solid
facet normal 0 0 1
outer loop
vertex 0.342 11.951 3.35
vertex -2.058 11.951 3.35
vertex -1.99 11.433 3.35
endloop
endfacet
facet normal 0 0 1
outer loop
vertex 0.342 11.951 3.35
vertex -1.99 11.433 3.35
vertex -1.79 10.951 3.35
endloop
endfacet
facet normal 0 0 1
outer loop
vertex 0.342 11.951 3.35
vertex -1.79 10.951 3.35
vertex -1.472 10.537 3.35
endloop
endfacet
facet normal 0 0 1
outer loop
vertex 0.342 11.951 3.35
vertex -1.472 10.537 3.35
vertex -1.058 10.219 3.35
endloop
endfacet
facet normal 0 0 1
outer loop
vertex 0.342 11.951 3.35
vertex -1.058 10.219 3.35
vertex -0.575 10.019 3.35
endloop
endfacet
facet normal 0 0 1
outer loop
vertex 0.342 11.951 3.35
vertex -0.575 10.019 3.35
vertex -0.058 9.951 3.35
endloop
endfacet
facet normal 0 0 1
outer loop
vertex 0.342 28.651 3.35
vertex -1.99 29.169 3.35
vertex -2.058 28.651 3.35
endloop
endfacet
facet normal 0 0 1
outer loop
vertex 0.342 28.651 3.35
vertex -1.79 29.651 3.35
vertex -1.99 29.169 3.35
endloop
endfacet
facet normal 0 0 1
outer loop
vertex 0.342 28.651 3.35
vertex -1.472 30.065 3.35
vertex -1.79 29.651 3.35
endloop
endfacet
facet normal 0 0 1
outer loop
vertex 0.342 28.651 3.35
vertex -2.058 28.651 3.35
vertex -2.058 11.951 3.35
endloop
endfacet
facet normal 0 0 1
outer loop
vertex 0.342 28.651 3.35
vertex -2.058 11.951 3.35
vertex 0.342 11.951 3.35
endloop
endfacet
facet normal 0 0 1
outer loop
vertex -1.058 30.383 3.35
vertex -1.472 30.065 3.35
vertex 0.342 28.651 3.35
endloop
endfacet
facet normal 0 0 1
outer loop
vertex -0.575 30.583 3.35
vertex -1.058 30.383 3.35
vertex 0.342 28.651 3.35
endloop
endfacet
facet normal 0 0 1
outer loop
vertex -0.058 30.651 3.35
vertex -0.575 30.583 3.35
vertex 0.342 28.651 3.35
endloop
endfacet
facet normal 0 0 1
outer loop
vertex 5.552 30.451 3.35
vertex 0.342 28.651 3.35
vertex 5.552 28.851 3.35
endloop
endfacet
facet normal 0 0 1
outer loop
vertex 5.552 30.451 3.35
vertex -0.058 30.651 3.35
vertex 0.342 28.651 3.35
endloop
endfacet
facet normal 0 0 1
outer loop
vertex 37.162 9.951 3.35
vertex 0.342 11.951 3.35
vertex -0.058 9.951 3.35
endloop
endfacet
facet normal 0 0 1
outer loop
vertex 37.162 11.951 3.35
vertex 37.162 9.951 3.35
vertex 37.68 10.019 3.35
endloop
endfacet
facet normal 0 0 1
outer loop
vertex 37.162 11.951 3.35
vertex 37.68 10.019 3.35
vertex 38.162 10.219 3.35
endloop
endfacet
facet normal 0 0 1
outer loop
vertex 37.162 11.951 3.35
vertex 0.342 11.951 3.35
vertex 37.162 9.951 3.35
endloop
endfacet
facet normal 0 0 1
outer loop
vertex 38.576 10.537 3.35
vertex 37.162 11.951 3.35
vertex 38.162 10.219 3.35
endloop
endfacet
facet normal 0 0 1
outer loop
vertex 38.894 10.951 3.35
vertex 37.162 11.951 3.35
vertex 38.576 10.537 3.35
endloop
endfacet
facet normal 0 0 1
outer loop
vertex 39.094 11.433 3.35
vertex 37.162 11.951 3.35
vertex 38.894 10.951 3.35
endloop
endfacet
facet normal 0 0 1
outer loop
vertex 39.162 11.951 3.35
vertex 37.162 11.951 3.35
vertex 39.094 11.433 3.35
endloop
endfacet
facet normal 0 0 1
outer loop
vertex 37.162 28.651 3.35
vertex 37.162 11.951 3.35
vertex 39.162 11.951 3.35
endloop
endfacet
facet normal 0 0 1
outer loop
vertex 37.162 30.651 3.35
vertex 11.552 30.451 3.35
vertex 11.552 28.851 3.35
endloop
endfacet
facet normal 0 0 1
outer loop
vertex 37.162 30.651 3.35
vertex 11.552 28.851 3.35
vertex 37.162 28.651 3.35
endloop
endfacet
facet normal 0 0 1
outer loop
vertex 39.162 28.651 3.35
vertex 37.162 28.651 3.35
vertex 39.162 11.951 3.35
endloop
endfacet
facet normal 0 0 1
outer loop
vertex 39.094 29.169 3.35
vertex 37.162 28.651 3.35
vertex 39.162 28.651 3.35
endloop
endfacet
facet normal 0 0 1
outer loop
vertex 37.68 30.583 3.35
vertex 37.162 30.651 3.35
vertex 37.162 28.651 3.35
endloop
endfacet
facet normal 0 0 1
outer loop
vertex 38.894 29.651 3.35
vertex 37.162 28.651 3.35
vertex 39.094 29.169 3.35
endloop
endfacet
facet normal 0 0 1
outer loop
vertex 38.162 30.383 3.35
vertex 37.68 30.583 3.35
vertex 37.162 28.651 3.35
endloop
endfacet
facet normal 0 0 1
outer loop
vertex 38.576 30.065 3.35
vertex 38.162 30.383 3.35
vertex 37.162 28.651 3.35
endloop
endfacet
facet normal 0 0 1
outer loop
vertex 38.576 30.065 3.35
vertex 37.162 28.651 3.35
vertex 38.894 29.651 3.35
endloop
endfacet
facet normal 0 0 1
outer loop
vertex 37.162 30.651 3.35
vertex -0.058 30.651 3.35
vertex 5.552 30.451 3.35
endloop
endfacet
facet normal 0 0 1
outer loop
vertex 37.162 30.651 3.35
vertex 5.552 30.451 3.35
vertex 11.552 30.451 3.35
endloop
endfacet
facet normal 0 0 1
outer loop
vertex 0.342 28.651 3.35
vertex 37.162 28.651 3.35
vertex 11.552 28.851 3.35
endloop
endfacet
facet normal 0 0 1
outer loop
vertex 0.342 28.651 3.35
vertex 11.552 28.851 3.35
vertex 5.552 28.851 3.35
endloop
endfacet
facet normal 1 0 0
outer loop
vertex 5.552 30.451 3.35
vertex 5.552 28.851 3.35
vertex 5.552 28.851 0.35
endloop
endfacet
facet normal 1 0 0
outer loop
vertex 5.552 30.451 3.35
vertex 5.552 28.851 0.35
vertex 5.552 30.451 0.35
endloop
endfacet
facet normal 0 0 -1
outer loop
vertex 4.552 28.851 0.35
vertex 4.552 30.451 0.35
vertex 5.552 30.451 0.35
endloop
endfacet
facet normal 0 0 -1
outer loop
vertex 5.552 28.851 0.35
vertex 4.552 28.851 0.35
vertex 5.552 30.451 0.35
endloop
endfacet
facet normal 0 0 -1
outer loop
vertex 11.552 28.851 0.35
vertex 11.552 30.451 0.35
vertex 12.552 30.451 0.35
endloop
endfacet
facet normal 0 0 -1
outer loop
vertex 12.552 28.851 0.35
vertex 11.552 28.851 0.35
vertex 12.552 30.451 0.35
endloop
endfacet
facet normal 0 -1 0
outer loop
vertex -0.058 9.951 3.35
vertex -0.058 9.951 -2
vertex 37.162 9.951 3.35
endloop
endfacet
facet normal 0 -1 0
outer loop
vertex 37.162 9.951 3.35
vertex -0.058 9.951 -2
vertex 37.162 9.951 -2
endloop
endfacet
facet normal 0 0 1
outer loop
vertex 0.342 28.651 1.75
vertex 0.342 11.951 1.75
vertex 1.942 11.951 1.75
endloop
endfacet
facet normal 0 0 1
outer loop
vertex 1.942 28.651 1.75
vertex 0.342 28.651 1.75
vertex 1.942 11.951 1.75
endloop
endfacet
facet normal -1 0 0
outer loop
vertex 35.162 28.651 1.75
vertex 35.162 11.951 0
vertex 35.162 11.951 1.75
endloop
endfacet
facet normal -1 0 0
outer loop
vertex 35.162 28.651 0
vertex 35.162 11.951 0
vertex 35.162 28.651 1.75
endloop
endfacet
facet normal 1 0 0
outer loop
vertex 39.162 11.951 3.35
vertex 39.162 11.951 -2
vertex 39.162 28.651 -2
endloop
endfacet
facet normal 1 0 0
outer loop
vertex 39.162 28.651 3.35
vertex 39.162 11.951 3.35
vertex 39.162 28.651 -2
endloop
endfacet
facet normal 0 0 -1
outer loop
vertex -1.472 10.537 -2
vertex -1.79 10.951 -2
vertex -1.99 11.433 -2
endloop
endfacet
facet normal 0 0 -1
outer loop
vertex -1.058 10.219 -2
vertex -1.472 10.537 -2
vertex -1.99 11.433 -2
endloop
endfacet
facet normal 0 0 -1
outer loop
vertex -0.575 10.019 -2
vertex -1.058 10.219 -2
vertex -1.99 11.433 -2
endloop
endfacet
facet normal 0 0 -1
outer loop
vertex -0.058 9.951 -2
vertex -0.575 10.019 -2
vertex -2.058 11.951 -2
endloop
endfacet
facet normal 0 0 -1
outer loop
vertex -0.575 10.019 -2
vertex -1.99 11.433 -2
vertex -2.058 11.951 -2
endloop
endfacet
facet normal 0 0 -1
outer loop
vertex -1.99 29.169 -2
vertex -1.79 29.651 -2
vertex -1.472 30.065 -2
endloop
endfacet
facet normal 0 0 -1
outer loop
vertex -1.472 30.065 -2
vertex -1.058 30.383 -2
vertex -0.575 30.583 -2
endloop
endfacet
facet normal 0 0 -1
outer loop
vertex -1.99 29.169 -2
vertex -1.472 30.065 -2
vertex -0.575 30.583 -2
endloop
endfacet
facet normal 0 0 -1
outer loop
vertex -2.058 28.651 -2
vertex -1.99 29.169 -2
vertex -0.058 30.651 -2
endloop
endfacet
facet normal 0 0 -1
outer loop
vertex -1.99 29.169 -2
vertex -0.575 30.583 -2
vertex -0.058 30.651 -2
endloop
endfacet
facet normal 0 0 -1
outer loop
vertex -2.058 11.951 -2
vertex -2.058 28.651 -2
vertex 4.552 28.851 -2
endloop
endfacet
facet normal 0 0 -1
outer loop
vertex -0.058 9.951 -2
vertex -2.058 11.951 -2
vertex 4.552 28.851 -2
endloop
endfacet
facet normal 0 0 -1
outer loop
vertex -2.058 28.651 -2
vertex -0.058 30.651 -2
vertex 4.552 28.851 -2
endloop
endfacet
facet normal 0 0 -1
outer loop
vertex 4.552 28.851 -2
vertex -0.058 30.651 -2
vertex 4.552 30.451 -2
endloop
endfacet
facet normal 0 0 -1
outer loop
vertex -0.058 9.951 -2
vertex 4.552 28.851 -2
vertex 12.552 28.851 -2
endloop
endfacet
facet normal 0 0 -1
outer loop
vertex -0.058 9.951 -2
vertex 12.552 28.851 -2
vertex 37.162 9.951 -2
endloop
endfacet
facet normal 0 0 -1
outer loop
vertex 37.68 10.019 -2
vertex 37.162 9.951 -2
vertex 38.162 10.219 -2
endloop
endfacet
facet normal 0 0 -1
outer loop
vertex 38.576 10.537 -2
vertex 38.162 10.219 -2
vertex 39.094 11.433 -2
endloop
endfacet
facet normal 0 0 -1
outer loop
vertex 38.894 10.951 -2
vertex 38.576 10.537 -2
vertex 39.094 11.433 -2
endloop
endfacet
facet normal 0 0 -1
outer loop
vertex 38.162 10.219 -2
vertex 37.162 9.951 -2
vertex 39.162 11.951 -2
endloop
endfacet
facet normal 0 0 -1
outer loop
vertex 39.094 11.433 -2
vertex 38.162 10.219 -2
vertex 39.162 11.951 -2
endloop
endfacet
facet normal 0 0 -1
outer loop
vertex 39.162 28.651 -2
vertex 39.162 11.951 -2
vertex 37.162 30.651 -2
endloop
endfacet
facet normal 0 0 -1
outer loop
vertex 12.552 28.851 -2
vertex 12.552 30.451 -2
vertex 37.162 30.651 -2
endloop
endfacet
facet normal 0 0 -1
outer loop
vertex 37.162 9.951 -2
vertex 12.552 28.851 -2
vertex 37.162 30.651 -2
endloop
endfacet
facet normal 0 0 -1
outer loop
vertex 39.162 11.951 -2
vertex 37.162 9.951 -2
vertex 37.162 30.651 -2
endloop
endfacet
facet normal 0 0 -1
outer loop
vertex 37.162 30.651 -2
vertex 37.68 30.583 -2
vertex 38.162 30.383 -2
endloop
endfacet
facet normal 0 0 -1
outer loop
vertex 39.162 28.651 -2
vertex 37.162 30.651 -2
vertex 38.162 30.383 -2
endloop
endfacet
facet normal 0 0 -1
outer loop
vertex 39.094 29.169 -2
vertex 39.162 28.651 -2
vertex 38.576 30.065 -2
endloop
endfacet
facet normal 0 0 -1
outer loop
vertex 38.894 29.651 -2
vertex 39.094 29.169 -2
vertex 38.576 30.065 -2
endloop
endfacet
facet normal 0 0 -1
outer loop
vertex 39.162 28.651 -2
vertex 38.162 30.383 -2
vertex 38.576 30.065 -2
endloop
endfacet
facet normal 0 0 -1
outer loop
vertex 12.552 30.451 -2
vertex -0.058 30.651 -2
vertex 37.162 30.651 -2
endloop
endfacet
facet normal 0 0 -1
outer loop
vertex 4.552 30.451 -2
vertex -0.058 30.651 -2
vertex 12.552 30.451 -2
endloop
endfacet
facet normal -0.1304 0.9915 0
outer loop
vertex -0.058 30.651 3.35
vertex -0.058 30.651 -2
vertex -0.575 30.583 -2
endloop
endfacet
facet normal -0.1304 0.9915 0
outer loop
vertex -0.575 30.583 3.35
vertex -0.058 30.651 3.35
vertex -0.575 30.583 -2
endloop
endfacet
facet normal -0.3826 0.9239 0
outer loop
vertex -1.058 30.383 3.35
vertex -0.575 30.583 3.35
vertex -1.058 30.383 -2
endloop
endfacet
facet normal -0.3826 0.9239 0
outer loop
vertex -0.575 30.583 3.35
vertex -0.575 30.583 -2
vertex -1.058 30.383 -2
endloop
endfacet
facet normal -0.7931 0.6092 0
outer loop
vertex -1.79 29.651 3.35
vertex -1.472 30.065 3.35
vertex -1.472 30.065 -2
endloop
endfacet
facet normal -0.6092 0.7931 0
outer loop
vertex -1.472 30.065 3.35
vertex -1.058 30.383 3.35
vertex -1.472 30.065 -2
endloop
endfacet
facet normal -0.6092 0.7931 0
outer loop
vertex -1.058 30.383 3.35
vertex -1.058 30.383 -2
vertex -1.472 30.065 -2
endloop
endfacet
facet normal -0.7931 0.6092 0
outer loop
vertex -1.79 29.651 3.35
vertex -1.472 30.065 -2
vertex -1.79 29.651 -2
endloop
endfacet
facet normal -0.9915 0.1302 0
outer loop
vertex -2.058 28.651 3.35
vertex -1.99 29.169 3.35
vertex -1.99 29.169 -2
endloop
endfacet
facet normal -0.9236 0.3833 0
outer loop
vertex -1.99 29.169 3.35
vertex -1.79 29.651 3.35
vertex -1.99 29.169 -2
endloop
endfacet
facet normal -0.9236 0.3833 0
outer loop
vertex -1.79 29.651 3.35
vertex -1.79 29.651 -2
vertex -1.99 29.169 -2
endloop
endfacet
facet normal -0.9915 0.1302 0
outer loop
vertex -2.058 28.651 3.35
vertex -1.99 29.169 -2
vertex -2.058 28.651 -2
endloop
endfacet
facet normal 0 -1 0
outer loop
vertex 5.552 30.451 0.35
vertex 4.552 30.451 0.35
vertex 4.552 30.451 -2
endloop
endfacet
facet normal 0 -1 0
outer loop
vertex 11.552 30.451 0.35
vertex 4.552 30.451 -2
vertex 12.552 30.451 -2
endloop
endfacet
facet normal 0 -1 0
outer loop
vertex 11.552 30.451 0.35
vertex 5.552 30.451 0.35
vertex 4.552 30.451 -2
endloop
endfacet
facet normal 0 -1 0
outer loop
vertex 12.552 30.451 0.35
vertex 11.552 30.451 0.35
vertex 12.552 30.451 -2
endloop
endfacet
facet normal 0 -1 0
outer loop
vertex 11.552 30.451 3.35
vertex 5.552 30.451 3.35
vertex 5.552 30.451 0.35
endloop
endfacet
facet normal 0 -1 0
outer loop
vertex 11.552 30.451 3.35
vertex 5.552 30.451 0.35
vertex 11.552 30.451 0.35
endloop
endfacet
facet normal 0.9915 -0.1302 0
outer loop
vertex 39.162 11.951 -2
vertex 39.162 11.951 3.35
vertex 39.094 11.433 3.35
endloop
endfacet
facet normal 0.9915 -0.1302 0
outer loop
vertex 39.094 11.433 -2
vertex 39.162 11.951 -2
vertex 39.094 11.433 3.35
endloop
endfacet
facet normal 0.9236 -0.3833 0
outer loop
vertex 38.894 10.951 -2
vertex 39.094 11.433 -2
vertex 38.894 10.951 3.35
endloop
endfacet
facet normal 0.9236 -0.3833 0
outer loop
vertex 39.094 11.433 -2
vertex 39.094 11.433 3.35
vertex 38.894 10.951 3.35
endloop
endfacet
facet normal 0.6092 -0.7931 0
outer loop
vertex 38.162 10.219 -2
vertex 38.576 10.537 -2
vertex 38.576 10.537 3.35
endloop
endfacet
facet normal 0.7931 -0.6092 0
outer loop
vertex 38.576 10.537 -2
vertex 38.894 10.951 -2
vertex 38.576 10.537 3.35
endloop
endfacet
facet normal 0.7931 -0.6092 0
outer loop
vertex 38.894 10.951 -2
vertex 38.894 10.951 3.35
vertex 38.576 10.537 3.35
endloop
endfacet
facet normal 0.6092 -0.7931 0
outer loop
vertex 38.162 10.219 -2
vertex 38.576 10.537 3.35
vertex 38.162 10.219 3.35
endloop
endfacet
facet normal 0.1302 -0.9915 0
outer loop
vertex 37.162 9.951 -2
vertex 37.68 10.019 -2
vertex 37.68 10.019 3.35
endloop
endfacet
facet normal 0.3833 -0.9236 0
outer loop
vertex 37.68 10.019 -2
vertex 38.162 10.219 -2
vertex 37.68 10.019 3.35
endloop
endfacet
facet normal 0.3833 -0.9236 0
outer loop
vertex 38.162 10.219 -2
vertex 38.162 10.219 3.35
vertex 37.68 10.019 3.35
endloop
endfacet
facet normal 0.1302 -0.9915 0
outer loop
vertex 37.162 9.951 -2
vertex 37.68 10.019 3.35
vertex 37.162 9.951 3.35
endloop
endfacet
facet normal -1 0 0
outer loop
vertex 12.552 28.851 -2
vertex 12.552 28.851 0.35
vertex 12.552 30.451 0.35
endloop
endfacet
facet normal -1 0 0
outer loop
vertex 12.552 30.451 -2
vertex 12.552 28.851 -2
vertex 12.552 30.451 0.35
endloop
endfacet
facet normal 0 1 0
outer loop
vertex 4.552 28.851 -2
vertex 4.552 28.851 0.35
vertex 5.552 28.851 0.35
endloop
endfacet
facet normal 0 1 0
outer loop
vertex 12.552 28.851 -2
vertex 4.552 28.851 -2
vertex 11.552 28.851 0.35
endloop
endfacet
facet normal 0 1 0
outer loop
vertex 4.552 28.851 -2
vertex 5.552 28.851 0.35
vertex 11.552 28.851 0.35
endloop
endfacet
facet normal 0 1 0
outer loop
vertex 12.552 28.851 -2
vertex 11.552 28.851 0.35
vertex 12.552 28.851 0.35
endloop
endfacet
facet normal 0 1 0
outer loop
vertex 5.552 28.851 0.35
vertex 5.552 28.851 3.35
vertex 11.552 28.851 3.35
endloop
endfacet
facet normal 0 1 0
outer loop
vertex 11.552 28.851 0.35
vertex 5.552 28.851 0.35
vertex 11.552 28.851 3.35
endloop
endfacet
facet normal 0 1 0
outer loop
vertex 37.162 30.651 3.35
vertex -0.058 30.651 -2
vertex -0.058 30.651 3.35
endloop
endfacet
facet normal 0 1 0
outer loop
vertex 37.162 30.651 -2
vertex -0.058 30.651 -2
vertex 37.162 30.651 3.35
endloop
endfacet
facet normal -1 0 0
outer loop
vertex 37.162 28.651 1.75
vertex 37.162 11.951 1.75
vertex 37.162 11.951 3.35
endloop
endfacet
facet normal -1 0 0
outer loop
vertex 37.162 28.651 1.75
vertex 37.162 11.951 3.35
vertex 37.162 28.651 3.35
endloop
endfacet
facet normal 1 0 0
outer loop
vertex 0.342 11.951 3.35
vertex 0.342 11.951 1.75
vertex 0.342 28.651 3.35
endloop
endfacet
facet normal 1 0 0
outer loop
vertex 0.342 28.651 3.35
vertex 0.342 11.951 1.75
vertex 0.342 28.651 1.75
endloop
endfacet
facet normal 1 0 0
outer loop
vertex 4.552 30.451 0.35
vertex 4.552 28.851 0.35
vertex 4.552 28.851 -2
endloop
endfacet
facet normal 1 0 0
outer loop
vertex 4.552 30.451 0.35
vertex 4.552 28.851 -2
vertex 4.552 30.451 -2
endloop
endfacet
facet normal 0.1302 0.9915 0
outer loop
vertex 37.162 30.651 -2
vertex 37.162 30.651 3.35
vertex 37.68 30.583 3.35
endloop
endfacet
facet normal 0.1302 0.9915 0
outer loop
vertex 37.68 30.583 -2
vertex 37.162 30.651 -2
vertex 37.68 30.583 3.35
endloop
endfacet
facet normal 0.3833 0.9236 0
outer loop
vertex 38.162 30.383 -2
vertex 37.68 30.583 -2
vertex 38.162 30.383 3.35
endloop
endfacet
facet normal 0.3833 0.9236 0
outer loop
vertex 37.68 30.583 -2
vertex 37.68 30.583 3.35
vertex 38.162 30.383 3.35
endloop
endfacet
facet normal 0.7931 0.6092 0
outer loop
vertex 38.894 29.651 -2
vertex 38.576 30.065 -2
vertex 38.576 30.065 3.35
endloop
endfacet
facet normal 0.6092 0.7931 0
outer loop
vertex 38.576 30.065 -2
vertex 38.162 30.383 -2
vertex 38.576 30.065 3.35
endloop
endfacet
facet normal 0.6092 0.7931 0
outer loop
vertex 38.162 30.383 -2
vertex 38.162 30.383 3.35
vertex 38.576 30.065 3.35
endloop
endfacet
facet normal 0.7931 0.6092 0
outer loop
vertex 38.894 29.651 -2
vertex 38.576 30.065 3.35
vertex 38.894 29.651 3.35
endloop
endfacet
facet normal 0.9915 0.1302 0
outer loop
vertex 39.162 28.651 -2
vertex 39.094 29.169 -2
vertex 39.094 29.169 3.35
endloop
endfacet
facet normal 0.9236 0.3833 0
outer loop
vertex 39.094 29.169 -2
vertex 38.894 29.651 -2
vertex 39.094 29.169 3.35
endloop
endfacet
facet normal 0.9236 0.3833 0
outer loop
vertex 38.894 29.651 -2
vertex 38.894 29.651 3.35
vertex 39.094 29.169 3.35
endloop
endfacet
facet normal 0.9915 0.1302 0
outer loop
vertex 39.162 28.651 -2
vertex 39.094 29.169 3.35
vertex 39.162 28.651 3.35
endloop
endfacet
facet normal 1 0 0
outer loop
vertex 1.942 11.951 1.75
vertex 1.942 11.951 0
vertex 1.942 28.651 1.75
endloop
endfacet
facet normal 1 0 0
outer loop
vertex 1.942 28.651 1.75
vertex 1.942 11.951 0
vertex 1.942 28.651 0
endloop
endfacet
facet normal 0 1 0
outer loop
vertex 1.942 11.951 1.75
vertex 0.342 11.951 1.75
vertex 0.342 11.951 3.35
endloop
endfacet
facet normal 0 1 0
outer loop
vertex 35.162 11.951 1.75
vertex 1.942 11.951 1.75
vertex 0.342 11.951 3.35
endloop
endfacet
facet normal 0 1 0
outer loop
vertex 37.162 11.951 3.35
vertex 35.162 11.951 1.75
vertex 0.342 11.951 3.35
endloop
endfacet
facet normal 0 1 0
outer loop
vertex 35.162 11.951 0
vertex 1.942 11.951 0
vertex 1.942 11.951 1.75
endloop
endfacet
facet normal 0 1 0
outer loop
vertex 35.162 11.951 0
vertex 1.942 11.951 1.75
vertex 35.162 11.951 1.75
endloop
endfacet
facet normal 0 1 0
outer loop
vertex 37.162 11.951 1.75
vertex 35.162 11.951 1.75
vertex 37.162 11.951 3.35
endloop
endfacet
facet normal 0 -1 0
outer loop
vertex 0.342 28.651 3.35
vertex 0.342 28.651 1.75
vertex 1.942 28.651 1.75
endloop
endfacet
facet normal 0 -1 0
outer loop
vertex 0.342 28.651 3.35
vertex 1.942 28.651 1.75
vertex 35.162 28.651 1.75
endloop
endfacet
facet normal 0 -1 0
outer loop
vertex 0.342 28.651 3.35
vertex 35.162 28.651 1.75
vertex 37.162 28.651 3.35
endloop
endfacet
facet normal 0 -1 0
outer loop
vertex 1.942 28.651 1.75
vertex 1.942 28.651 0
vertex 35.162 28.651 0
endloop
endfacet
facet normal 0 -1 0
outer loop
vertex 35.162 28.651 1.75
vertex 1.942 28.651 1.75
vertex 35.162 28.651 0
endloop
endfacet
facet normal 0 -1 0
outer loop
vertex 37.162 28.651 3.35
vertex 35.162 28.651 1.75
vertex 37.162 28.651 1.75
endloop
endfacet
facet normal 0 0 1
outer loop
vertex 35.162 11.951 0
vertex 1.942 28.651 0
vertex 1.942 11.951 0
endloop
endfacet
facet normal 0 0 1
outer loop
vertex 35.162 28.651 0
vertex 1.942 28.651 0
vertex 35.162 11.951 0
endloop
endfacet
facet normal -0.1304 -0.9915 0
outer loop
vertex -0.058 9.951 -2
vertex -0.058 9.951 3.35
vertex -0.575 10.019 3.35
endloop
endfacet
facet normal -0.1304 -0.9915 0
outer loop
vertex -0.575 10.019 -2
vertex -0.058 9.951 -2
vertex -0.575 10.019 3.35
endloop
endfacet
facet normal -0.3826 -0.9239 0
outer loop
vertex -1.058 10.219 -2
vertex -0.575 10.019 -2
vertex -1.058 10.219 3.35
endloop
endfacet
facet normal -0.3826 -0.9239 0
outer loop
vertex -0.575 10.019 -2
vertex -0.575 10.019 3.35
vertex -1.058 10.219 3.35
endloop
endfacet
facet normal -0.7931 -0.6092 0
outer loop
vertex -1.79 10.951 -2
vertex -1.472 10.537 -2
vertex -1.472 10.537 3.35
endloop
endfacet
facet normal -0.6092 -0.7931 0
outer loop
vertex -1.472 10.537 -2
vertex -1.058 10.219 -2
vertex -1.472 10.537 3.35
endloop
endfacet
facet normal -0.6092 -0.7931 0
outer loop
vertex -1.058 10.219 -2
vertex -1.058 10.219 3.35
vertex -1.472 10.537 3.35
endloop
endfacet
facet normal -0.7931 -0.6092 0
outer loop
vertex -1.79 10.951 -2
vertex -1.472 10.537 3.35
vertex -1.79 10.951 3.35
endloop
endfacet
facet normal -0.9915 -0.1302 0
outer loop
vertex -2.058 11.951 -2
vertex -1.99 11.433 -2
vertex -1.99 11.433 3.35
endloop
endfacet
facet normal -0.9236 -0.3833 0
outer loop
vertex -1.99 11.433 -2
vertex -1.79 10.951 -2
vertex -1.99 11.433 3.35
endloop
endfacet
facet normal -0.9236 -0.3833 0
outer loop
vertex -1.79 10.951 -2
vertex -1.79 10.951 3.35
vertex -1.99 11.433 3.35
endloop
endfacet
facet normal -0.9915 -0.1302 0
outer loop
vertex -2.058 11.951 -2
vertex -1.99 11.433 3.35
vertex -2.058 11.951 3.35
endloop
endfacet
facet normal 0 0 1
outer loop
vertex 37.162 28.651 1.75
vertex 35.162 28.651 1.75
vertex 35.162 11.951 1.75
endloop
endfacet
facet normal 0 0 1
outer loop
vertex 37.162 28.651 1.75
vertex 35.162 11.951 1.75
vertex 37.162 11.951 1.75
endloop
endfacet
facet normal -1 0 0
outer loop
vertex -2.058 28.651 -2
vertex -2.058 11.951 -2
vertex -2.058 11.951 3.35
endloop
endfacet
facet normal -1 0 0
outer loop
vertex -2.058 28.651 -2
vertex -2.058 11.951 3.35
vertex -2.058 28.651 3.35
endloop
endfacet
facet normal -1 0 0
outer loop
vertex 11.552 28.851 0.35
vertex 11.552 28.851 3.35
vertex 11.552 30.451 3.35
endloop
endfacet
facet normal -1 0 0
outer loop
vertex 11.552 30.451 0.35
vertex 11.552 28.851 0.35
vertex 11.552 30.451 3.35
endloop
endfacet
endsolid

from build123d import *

# Parameters (mm, degrees)
CROQUIS1_W              = 37.22
CROQUIS1_H              = 16.7
SALIENTE_EXTRUIR1_DEPTH = 3.35
VACIADO1_T              = 2
REDONDEO1_R             = 2
CROQUIS2_W              = 2
CROQUIS2_H              = 16.7
SALIENTE_EXTRUIR2_DEPTH = 1.75
CROQUIS6_W              = 0.4
CROQUIS6_H              = 16.7
SALIENTE_EXTRUIR5_DEPTH = 1.6
CROQUIS7_W              = 6
CROQUIS7_H              = 1.6
CORTAR_EXTRUIR1_DEPTH   = 3
CROQUIS10_W             = 8
CROQUIS10_H             = 1.6
CORTAR_EXTRUIR2_DEPTH   = 3


with BuildPart() as part:
    # Croquis1 → Saliente-Extruir1 (new body)
    with BuildSketch(Plane.XY):
        with Locations((18.552250715, 20.301071835)):
            Rectangle(CROQUIS1_W, CROQUIS1_H)
    extrude(amount=SALIENTE_EXTRUIR1_DEPTH)

    # Vaciado1
    vaciado1_openings = [part.faces().sort_by_distance(p)[0] for p in [
        (18.552250715, 20.301071835, 3.35),
    ]]
    offset(amount=VACIADO1_T, openings=vaciado1_openings, kind=Kind.INTERSECTION)

    # Redondeo1
    # the kernel refuses this fillet: 2 mm, written as the material it takes off along each edge
    with BuildSketch(Plane(origin=(-2.057749285, 30.651071835, -7), x_dir=(1, 0, 0), z_dir=(0, 0, 1)), Plane(origin=(39.162250715, 30.651071835, 8.35), x_dir=(-1, 0, 0), z_dir=(0, 0, -1)), Plane(origin=(39.162250715, 9.951071835, 8.35), x_dir=(0, 1, 0), z_dir=(0, 0, -1)), Plane(origin=(-2.057749285, 9.951071835, 8.35), x_dir=(1, 0, 0), z_dir=(0, 0, -1))) as redondeo1_piece_1:
        with BuildLine():
            CenterArc((REDONDEO1_R, -REDONDEO1_R), REDONDEO1_R, 90, 90)
            Line((0, -REDONDEO1_R), (0, 0))
            Line((0, 0), (REDONDEO1_R, 0))
        make_face()
    extrude(amount=15.35, mode=Mode.SUBTRACT)

    # Croquis2 → Saliente-Extruir2 (add)
    with BuildSketch(Plane.XY):
        with Locations((0.942250715, 20.301071835)):
            Rectangle(CROQUIS2_W, CROQUIS2_H)
        with Locations((36.162250715, 20.301071835)):
            Rectangle(CROQUIS2_W, CROQUIS2_H)
    extrude(amount=SALIENTE_EXTRUIR2_DEPTH)

    # Croquis6 → Saliente-Extruir5 (add)
    with BuildSketch(Plane.XY.offset(1.75)):
        with Locations((0.142250715, 20.301071835)):
            Rectangle(CROQUIS6_W, CROQUIS6_H)
    extrude(amount=SALIENTE_EXTRUIR5_DEPTH)

    # Croquis7 → Cortar-Extruir1 (cut)
    with BuildSketch(Plane.XY.offset(3.35)):
        with Locations((8.552250715, 29.651071835)):
            Rectangle(CROQUIS7_W, CROQUIS7_H)
    extrude(amount=-CORTAR_EXTRUIR1_DEPTH, mode=Mode.SUBTRACT)

    # Croquis10 → Cortar-Extruir2 (cut)
    with BuildSketch(Plane.XY.offset(0.35)):
        with Locations((8.552250715, 29.651071835)):
            Rectangle(CROQUIS10_W, CROQUIS10_H)
    extrude(amount=-CORTAR_EXTRUIR2_DEPTH, mode=Mode.SUBTRACT)


solid = part.part
